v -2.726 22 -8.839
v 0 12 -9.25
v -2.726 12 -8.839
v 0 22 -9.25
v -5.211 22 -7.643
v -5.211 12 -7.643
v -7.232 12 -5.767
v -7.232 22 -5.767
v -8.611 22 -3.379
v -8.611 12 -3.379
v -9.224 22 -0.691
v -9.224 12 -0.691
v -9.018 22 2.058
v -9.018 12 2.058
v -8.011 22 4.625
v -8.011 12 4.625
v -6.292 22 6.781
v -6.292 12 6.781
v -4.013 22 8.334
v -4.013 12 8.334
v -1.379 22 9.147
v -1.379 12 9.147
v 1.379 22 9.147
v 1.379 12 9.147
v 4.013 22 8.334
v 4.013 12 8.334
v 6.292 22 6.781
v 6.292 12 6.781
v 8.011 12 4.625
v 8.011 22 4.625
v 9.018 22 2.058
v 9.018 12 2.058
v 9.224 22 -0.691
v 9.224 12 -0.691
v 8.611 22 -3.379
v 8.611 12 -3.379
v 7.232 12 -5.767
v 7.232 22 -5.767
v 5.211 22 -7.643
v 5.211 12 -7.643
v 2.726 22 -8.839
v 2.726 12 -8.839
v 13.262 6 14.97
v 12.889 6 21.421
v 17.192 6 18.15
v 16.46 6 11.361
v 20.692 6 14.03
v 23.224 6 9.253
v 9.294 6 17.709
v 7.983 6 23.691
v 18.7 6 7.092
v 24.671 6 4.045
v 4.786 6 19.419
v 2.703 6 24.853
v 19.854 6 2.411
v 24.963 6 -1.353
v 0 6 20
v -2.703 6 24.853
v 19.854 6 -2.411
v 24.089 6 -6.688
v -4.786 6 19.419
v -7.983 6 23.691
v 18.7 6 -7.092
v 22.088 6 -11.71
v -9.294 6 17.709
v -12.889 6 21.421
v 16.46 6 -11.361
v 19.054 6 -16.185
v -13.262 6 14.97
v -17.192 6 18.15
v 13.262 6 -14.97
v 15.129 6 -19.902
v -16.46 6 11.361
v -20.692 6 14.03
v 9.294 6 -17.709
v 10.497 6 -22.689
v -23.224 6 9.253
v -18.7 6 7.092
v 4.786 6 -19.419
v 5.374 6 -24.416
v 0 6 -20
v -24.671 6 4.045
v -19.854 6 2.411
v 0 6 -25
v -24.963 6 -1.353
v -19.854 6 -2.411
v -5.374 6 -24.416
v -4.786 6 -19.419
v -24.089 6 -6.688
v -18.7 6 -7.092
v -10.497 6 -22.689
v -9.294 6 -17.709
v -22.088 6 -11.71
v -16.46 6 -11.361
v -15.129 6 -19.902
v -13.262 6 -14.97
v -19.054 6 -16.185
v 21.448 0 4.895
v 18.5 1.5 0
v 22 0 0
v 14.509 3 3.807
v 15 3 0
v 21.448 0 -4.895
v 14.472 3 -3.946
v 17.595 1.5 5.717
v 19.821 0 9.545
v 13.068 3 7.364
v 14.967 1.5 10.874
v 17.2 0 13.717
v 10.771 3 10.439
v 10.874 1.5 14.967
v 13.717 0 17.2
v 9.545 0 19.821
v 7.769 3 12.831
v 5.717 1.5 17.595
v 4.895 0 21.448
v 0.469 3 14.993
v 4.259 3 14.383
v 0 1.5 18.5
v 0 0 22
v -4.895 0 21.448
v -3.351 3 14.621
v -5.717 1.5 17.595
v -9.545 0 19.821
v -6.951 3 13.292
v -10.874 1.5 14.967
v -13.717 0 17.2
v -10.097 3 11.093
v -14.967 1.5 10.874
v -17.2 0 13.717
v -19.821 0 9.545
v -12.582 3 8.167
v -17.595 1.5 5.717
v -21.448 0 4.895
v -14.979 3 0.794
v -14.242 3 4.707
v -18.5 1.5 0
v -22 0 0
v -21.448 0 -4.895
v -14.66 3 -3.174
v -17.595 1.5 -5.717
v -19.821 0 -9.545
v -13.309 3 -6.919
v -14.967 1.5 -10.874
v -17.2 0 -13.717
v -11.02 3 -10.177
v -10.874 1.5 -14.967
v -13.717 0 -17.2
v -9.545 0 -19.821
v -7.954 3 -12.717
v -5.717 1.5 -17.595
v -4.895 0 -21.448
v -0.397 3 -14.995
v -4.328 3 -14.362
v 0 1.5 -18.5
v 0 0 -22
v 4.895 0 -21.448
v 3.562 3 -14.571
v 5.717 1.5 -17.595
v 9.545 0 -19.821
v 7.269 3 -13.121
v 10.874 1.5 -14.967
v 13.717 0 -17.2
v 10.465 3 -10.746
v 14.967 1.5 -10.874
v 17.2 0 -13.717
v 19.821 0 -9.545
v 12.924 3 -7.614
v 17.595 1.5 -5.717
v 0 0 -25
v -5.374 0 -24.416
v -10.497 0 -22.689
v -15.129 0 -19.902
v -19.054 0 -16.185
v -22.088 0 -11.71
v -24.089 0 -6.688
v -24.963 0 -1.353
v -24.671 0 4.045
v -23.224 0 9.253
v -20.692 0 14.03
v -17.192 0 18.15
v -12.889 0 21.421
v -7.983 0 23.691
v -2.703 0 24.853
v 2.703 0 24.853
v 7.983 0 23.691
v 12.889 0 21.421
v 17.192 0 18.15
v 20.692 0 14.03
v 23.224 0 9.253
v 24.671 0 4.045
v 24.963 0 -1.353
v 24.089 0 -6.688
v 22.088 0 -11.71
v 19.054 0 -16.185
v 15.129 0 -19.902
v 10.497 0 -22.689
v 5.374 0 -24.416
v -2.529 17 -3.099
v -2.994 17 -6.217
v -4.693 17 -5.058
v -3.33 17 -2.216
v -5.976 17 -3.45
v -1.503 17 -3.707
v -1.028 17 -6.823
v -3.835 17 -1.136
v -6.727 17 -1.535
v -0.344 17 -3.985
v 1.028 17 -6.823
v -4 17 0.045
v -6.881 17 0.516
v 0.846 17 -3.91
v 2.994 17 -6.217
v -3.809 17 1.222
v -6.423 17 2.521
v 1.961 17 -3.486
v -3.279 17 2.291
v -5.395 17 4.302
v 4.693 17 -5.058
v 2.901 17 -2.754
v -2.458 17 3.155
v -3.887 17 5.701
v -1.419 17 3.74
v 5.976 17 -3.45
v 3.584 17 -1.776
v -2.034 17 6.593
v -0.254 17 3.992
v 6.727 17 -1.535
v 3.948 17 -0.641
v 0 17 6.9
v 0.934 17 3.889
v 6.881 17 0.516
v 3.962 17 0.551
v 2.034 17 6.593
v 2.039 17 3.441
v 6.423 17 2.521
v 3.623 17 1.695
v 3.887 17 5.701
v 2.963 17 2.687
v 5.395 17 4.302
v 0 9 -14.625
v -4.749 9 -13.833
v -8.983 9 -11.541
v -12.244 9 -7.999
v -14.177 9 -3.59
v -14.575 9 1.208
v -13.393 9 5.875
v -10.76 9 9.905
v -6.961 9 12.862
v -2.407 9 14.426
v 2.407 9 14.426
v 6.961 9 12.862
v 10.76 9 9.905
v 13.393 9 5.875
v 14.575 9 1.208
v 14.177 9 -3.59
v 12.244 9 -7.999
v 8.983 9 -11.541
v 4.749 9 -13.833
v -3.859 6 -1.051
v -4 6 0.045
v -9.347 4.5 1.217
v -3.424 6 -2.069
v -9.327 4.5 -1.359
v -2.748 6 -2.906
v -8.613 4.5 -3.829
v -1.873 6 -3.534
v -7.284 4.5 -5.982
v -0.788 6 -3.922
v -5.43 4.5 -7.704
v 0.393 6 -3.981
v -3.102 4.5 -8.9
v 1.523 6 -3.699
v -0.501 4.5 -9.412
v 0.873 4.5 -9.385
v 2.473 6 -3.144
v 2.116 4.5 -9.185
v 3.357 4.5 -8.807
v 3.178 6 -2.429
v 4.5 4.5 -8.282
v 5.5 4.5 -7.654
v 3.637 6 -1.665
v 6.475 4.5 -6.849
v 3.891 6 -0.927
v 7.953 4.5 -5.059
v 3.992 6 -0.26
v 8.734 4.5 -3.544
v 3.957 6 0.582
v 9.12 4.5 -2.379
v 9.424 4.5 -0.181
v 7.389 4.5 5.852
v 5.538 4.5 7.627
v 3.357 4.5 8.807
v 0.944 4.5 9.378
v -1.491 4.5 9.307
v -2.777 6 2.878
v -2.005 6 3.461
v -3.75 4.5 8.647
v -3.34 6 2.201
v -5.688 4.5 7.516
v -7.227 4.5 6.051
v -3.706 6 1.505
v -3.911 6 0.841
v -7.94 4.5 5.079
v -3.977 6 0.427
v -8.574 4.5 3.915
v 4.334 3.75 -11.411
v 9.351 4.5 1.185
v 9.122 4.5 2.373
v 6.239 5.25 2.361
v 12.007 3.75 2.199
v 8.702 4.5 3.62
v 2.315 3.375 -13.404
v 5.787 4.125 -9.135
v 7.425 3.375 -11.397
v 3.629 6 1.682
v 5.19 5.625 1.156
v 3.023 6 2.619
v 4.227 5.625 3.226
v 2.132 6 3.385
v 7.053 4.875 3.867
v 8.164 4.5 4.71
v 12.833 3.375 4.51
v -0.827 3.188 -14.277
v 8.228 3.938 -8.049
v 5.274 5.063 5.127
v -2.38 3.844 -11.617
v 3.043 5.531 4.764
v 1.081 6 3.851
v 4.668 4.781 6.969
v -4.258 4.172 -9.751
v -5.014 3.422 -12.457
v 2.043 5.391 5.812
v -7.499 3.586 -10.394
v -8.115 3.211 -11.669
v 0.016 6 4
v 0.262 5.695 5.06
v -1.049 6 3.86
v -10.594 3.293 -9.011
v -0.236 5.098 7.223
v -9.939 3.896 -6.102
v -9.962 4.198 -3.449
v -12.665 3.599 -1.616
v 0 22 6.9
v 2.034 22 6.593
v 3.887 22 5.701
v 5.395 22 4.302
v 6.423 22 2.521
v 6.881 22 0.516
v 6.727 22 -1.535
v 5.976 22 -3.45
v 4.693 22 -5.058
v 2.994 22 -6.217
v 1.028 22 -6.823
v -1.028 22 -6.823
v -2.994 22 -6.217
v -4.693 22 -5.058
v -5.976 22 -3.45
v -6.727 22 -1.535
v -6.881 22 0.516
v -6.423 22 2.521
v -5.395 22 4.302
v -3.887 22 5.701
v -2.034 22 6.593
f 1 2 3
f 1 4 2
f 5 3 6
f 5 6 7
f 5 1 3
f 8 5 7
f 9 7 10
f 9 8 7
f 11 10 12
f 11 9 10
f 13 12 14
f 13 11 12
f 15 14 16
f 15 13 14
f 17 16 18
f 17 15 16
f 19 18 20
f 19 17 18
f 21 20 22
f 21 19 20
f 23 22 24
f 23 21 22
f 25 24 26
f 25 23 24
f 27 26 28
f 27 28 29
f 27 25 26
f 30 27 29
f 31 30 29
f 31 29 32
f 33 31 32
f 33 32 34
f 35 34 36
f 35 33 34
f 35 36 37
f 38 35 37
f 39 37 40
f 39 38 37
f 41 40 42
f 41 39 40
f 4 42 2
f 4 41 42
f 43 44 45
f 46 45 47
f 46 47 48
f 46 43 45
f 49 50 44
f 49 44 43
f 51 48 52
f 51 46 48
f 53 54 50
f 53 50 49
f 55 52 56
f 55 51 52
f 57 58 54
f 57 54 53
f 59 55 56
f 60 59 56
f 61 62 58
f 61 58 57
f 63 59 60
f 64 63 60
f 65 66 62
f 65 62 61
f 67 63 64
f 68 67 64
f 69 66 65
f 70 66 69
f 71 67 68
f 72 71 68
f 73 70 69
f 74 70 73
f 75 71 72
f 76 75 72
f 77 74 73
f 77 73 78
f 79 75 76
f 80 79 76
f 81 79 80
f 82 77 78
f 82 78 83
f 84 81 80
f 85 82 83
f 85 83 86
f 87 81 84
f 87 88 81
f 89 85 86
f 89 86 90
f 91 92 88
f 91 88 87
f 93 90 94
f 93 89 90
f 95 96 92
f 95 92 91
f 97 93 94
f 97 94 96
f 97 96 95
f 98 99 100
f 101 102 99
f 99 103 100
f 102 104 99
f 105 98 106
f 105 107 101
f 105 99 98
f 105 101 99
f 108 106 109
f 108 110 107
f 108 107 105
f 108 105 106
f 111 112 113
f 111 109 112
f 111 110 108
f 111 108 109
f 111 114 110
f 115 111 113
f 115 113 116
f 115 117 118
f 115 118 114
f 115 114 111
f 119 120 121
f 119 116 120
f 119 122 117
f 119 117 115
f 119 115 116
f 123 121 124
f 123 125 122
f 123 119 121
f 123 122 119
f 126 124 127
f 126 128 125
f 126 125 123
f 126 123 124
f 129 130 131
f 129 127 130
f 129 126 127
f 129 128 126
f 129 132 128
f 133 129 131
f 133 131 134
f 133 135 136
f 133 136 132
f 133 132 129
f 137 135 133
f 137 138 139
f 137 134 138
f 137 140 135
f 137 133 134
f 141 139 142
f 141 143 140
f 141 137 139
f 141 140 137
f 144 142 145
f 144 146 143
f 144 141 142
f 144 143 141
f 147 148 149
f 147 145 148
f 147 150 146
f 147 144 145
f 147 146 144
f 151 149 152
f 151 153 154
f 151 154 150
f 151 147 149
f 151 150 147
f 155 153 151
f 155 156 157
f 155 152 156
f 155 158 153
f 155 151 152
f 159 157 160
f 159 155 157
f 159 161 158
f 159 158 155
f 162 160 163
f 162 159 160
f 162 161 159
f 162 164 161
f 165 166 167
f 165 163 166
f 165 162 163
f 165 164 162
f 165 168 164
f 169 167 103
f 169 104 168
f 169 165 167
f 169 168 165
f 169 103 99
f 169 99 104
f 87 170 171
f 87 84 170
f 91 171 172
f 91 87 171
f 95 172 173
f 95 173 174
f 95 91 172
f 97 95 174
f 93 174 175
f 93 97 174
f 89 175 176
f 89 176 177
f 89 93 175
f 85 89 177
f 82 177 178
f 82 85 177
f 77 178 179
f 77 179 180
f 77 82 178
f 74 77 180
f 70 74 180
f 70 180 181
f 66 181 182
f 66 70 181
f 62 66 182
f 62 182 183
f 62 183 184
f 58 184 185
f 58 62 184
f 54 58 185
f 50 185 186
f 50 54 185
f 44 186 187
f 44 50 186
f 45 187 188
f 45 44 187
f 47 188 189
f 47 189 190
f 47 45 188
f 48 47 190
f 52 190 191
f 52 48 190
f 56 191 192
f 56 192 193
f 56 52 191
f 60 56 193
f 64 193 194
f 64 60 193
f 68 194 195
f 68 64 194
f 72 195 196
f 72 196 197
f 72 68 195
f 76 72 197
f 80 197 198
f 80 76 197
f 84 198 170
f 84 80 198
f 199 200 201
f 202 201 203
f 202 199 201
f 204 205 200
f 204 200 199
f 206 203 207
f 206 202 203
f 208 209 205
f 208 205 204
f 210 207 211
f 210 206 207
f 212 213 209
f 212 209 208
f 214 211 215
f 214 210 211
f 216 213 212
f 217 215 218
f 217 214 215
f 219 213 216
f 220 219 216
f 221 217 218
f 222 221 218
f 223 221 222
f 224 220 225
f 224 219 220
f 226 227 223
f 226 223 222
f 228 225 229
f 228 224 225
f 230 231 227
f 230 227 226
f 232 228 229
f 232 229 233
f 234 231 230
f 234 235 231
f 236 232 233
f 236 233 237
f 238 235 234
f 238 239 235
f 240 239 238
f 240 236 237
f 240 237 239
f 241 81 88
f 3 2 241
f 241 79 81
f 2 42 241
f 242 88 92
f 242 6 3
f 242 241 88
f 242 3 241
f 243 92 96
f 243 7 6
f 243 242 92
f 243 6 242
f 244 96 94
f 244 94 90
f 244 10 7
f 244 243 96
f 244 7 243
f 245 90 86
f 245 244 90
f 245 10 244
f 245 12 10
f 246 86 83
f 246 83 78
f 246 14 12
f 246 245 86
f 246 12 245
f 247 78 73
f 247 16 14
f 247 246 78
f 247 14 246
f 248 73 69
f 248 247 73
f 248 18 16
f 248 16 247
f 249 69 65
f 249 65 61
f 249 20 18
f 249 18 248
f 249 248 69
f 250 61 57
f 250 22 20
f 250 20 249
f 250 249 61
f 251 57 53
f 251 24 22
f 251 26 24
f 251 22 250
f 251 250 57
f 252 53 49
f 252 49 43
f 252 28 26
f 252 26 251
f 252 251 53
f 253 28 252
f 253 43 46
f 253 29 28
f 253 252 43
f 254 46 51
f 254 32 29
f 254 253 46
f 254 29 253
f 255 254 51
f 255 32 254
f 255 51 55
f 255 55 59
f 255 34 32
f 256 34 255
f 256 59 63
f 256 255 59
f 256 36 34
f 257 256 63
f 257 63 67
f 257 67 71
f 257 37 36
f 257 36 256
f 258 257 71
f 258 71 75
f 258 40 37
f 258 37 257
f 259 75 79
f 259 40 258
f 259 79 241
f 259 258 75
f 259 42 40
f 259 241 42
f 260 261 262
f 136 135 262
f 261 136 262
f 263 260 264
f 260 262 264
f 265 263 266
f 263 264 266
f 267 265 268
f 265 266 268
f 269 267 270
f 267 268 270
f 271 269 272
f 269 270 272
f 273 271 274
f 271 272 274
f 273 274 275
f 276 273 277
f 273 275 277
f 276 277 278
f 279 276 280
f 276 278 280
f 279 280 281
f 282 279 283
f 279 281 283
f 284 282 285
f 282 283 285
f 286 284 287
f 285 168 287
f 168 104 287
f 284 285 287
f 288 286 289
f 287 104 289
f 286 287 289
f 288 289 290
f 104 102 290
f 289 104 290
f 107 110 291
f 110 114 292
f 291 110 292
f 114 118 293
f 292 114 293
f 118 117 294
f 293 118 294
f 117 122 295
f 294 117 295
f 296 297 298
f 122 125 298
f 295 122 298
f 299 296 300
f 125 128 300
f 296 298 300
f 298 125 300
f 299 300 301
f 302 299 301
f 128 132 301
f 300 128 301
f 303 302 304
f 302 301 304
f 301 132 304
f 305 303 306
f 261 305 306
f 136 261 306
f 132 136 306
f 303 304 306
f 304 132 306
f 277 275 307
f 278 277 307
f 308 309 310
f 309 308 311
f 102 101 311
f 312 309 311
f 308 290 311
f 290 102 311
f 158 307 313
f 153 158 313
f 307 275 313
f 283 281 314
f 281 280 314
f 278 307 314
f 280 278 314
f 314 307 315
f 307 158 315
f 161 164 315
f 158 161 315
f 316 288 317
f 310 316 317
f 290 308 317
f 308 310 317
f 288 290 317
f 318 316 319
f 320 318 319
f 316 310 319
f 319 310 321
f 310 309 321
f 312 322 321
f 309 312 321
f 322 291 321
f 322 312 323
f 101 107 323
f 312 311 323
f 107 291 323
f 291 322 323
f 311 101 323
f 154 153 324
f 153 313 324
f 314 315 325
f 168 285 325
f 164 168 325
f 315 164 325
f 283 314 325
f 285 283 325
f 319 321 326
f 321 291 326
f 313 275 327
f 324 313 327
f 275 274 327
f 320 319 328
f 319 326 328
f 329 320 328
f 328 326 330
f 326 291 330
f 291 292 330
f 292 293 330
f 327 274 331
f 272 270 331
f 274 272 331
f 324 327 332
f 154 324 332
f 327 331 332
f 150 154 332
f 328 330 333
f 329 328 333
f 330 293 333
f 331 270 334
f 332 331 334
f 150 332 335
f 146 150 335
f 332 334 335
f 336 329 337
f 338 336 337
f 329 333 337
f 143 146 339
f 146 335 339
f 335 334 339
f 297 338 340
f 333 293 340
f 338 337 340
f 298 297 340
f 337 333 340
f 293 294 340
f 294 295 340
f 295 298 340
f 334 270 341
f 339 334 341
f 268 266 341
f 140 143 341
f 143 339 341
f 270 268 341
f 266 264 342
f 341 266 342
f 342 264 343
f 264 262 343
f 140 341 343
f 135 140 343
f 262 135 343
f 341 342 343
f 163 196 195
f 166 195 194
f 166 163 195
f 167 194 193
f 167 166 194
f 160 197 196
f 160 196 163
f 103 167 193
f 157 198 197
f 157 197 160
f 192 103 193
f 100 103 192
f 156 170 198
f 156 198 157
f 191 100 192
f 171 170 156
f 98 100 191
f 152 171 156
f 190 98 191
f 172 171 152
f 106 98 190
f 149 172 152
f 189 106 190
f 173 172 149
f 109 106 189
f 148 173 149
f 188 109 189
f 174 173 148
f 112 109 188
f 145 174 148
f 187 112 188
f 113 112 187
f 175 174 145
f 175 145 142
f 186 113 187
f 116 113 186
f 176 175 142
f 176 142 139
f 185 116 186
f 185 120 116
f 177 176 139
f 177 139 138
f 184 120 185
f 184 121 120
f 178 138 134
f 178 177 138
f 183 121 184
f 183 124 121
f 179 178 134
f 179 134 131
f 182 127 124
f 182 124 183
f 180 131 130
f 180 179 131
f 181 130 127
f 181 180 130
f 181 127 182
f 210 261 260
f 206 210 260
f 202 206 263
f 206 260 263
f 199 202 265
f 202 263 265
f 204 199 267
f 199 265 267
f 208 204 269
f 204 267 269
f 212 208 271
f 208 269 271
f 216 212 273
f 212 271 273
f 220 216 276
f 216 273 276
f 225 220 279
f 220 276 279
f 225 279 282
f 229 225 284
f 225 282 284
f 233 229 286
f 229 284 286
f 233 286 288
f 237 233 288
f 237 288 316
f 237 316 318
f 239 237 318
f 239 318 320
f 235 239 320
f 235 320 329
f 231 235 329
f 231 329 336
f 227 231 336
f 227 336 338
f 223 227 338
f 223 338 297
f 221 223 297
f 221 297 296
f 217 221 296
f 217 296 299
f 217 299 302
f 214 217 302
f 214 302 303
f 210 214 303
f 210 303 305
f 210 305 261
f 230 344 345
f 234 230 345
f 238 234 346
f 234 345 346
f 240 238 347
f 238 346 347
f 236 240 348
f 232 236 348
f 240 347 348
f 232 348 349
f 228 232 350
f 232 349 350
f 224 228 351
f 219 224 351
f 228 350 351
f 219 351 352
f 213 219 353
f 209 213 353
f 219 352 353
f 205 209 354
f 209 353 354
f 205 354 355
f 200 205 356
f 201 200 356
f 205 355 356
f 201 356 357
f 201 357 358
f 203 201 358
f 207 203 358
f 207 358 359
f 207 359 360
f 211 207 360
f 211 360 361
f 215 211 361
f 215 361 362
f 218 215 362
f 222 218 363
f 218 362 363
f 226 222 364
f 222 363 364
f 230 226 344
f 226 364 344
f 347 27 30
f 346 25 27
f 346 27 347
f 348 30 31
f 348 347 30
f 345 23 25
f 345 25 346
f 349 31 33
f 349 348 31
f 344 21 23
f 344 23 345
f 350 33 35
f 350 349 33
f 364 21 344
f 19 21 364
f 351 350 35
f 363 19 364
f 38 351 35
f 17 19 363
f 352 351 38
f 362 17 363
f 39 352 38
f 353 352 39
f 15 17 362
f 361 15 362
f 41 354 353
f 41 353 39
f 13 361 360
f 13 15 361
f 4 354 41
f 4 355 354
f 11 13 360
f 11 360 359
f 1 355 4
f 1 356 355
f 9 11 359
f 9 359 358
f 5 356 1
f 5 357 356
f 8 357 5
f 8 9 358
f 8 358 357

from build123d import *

# Parameters (mm, degrees)
SKETCH5_R          = 22
SKETCH7_R          = 15
SKETCH10_R         = 4
CUT_EXTRUDE1_DEPTH = 20
SKETCH11_R         = 6.9
CUT_EXTRUDE2_DEPTH = 5


with BuildPart() as part:
    # Sketch4 → Revolve1 (revolve)
    with BuildSketch(Plane.XY, mode=Mode.PRIVATE) as revolve1_sk:
        Polygon((25, 0), (25, 6), (20, 6), (9.25, 12), (9.25, 22), (0, 22), (0, 0), align=None)
    revolve(revolve1_sk.sketch.rotate(Axis((0, 0, 0), (0, 1, 0)), 90), axis=Axis((0, 0, 0), (0, 1, 0)))

    # Sketch5 → Cut-Loft1 section 0
    with BuildSketch(Plane.XZ):
        Circle(SKETCH5_R)
    # Sketch7 → Cut-Loft1 section 1
    with BuildSketch(Plane(origin=(0, 3, 0), x_dir=(-1, 0, 0), z_dir=(0, -1, 0))):
        Circle(SKETCH7_R)
    loft(mode=Mode.SUBTRACT)

    # Cut-Loft2: read off the stored shape, not the designer's step
    # Cut-Loft2: loft between two sections, ruled curve by curve
    cut_loft2_from = [
        Edge.make_bspline([(-3.999744183, 6, 0.04523797), (-4.090220122, 6, -7.954250395), (3.909268243, 6, -8.044726335), (3.999744183, 6, -0.04523797), (4.090220122, 6, 7.954250395), (-3.909268243, 6, 8.044726335), (-3.999744183, 6, 0.04523797)], [0, 0, 0, 0, 0.5, 0.5, 0.5, 1, 1, 1, 1], 3, [1, 0.333333333, 0.333333333, 1, 0.333333333, 0.333333333, 1]),
    ]
    cut_loft2_to = [
        Edge.make_bspline([(-14.242368289, 3, 4.706904028), (-23.656176345, 3, -23.777832549), (4.828560232, 3, -33.191640605), (14.242368289, 3, -4.706904028), (23.656176345, 3, 23.777832549), (-4.828560232, 3, 33.191640605), (-14.242368289, 3, 4.706904028)], [0, 0, 0, 0, 0.5, 0.5, 0.5, 1, 1, 1, 1], 3, [1, 0.333333333, 0.333333333, 1, 0.333333333, 0.333333333, 1]),
    ]
    cut_loft2 = Solid(Shell([*[Face.make_surface_from_curves(cut_loft2_from[k], cut_loft2_to[k]) for k in range(1)], Face(Wire(cut_loft2_from)), Face(Wire(cut_loft2_to))]))
    add(cut_loft2, mode=Mode.SUBTRACT)

    # Sketch10 → Cut-Extrude1 (cut)
    with BuildSketch(Plane.XZ.offset(-6)):
        with Locations(Location((0, 0, 0), (0, 0, 179.352))):
            Circle(SKETCH10_R)
    extrude(amount=-CUT_EXTRUDE1_DEPTH, mode=Mode.SUBTRACT)

    # Sketch11 → Cut-Extrude2 (cut)
    with BuildSketch(Plane(origin=(0, 22, 0), x_dir=(1, 0, 0), z_dir=(0, 1, 0))):
        with Locations(Location((0, 0, 0), (0, 0, 270))):
            Circle(SKETCH11_R)
    extrude(amount=-CUT_EXTRUDE2_DEPTH, mode=Mode.SUBTRACT)


solid = part.part
